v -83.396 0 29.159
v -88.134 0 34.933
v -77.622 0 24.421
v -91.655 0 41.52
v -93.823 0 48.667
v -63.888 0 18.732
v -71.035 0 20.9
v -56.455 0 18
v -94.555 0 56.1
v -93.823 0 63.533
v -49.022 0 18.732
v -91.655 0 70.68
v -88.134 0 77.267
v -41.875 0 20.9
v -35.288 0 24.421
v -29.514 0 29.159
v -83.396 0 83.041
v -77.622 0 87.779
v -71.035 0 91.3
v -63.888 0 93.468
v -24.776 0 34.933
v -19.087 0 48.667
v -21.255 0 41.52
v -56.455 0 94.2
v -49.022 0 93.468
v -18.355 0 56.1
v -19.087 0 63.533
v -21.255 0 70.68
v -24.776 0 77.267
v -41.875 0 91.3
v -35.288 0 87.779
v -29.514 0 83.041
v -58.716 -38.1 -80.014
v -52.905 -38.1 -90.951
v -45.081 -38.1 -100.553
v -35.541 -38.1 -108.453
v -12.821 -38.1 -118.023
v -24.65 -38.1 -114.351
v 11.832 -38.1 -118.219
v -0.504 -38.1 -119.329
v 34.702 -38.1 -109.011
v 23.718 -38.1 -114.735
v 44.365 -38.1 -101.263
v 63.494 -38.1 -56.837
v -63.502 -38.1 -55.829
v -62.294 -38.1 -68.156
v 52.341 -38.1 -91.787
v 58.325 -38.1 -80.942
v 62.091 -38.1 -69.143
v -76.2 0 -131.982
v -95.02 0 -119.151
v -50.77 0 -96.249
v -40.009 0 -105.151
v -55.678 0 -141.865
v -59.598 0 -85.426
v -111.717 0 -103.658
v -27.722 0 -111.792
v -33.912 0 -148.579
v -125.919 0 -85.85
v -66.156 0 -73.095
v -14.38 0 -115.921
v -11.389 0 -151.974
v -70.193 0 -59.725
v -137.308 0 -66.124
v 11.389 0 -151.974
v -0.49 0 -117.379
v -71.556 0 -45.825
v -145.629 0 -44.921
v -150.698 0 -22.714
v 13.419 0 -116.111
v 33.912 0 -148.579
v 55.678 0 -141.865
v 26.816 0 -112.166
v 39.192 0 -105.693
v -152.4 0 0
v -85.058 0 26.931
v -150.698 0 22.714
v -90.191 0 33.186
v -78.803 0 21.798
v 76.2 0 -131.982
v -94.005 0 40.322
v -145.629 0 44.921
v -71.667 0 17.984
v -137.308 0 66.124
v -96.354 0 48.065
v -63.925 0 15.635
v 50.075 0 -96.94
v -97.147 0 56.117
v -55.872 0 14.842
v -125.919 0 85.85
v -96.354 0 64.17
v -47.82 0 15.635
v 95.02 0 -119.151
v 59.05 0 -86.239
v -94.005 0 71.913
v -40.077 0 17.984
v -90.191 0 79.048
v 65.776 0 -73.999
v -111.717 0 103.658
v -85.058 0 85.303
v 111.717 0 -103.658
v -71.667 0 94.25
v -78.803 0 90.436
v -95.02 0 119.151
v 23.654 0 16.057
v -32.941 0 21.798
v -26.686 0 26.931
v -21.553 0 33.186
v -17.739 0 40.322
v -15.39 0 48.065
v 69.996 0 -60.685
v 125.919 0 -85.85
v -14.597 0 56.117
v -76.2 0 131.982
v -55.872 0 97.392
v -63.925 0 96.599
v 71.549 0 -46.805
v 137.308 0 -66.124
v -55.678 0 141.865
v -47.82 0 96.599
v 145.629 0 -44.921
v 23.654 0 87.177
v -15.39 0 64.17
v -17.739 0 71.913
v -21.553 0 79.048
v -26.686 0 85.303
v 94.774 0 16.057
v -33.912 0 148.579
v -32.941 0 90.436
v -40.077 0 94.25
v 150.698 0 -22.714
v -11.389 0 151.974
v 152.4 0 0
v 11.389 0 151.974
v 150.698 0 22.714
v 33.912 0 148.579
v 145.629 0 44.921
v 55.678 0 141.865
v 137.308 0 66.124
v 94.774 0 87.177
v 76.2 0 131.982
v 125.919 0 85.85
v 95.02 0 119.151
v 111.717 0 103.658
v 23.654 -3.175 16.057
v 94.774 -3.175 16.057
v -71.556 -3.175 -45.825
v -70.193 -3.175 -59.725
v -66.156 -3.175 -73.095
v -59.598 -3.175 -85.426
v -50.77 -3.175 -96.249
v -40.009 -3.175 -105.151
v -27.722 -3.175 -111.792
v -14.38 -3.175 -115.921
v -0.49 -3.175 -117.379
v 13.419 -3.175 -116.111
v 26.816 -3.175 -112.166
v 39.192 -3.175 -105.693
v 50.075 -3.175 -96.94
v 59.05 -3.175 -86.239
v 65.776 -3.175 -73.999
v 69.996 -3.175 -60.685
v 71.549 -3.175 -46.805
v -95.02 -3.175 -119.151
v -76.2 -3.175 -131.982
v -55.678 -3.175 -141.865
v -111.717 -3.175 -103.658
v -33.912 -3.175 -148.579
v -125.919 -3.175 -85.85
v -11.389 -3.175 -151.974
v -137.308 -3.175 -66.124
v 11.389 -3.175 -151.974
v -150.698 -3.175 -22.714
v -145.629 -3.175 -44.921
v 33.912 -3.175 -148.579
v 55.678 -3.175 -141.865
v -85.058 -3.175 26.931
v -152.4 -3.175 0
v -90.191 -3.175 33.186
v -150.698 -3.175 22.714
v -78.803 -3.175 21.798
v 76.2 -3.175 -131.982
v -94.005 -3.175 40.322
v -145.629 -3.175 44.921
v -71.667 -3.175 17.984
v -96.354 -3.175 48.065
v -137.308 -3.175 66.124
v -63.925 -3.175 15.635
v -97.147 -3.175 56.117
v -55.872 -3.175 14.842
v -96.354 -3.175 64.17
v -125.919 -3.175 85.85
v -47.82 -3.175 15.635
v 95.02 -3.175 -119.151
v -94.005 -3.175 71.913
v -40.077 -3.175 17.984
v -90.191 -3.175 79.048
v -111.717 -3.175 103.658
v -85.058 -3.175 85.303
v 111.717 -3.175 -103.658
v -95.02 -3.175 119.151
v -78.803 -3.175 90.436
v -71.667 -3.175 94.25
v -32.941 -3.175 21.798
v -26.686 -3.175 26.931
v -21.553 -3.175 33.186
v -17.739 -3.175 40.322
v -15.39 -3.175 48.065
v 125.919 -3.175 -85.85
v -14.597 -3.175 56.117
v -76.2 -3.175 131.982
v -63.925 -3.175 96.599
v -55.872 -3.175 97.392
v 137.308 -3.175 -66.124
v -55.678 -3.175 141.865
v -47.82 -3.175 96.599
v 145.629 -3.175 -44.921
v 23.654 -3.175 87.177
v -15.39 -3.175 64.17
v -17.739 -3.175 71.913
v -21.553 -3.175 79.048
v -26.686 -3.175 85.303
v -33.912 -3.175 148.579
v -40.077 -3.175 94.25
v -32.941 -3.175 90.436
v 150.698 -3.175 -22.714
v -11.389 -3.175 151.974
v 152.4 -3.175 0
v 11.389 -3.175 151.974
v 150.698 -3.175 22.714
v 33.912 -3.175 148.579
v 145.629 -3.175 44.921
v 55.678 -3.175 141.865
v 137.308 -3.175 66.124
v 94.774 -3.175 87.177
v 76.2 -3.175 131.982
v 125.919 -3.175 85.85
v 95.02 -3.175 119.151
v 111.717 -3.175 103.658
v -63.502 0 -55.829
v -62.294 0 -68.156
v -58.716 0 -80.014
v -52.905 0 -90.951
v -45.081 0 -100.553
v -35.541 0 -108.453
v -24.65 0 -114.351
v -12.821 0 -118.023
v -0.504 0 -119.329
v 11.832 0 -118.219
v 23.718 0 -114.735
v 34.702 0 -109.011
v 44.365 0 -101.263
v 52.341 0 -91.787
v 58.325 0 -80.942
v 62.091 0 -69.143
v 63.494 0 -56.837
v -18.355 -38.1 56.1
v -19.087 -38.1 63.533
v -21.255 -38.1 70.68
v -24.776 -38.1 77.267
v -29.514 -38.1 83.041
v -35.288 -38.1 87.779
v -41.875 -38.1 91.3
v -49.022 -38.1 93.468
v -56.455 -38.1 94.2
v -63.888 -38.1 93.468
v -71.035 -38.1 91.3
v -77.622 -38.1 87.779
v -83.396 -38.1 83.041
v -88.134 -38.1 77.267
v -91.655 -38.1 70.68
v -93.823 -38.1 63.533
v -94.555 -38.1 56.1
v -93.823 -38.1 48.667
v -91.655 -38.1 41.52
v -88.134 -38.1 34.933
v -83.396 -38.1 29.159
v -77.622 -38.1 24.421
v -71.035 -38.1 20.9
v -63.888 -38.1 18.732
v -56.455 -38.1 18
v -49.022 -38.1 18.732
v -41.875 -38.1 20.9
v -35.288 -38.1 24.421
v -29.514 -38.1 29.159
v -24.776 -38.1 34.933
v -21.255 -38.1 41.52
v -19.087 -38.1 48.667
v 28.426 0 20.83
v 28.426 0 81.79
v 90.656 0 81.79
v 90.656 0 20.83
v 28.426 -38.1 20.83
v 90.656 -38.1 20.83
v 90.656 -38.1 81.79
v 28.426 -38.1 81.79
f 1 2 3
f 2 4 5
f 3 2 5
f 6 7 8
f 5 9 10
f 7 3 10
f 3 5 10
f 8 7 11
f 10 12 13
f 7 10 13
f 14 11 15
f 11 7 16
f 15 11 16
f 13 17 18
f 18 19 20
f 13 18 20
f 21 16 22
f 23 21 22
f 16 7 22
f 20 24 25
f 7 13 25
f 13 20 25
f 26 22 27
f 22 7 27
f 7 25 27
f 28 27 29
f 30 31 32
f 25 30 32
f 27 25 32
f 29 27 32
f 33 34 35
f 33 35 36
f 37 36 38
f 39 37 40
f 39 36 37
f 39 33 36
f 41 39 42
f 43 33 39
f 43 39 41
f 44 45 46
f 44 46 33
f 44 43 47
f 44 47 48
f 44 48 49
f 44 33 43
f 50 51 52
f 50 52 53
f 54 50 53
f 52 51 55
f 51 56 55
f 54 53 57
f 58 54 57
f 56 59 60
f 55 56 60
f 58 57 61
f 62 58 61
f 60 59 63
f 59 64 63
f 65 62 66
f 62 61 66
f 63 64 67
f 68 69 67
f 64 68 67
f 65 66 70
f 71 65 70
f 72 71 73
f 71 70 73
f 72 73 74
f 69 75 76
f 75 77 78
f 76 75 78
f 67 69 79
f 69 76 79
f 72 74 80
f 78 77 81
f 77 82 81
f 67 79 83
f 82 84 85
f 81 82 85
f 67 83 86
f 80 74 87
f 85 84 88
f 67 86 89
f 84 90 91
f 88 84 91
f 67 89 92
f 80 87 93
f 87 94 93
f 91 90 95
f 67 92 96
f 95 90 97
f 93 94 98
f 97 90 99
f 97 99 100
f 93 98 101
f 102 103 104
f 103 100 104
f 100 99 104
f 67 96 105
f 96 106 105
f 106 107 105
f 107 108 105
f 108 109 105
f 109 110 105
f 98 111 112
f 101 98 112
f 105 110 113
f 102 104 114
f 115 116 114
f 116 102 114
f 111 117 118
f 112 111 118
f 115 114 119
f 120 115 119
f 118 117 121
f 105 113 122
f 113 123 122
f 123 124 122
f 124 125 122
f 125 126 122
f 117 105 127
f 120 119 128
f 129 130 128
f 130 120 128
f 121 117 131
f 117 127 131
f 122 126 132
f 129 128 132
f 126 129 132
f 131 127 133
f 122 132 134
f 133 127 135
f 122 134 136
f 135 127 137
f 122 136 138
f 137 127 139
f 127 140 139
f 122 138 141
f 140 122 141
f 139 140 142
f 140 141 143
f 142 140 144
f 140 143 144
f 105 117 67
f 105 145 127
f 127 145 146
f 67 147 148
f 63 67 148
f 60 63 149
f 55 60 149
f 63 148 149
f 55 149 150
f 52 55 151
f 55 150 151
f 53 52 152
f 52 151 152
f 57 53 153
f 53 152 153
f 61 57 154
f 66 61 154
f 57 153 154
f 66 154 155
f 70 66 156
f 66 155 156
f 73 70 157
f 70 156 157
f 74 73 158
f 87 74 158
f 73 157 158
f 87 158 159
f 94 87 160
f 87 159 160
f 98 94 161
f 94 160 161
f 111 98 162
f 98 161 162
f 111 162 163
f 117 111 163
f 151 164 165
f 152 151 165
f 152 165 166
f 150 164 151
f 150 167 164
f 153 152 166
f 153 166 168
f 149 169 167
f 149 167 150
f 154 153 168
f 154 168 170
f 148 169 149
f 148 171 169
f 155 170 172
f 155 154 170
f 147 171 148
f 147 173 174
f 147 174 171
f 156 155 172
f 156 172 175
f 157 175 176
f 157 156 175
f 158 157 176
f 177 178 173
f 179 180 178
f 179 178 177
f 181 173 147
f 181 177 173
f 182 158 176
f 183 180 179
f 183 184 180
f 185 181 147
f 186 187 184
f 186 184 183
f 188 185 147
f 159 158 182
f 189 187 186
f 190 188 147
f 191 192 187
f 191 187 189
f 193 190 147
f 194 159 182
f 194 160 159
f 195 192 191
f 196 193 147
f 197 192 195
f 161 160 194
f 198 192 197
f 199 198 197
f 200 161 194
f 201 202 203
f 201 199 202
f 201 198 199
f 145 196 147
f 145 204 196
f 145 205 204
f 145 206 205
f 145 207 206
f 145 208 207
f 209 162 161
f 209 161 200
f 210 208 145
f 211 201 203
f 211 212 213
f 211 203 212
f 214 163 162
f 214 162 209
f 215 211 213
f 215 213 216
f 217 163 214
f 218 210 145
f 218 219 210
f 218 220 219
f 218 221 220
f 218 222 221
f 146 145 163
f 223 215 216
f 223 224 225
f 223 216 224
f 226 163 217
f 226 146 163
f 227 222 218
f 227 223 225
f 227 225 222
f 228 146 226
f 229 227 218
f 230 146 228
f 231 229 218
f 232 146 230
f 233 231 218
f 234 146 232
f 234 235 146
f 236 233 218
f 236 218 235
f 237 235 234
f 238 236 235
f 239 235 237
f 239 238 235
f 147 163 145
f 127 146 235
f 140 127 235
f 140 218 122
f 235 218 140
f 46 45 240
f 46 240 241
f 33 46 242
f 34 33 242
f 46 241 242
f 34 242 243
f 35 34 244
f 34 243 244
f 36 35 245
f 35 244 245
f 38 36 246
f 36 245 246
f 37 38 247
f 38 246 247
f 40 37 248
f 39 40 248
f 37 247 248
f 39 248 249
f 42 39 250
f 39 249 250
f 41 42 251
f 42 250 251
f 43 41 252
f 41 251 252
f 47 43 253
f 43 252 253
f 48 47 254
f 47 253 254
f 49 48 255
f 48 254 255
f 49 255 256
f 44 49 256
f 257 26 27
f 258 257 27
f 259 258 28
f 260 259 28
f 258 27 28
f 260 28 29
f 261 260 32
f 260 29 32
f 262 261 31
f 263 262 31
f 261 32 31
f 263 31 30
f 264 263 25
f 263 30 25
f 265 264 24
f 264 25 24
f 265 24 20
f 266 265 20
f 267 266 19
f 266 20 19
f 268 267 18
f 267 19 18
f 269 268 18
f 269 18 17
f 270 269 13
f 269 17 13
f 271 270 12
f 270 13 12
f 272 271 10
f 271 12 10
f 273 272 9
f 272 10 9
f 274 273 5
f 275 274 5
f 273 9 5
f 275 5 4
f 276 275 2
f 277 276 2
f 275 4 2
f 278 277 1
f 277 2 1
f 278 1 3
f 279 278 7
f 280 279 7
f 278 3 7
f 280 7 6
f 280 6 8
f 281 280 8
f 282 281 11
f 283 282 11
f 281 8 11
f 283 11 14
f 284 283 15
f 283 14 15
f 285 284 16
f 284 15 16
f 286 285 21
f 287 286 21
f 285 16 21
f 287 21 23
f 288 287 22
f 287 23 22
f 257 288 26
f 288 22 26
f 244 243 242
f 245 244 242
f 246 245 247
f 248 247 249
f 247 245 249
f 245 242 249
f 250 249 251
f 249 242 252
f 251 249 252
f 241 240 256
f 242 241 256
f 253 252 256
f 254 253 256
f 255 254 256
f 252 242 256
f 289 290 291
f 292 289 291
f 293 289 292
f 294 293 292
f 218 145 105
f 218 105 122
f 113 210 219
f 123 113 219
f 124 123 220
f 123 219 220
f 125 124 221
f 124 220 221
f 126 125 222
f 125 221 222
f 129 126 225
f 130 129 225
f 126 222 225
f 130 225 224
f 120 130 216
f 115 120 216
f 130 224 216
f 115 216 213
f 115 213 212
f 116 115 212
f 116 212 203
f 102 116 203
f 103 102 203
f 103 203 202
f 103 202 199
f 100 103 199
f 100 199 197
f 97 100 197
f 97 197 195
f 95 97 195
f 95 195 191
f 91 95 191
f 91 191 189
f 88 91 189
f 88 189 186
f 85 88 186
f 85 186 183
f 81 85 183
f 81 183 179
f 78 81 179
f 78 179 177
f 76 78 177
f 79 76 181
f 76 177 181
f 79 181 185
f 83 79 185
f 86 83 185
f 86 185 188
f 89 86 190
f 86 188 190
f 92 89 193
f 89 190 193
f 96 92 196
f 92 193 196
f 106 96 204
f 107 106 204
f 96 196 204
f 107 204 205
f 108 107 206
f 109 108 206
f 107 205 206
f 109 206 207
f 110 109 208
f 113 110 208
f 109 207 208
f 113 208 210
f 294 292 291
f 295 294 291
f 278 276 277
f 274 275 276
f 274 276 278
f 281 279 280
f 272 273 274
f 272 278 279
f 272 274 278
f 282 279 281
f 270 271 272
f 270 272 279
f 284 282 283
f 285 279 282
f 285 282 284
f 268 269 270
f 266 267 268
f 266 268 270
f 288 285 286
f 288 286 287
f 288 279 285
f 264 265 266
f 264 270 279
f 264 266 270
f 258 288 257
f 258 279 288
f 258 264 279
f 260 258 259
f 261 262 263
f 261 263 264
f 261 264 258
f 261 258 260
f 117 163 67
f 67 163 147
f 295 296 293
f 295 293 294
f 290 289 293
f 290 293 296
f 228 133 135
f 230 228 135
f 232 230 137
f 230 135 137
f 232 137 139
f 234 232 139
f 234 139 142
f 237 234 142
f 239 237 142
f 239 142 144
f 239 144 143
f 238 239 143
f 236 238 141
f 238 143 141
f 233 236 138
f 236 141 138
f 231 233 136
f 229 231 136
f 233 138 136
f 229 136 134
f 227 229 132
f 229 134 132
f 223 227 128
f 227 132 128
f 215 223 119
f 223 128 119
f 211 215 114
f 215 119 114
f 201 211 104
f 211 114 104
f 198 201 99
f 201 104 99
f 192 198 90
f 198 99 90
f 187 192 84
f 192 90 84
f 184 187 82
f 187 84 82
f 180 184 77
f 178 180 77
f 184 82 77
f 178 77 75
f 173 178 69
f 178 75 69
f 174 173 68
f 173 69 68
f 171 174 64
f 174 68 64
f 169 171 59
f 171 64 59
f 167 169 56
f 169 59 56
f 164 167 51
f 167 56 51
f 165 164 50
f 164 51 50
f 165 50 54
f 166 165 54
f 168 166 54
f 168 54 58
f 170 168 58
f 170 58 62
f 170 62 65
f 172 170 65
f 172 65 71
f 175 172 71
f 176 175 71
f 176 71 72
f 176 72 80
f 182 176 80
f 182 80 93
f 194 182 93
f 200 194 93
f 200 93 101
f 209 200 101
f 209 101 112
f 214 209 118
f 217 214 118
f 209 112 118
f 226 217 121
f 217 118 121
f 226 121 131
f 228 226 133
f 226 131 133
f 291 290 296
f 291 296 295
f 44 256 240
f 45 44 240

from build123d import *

# Parameters (mm, degrees)
F0_R      = 152.4
F1_DEPTH  = 3.175
F3_W      = 71.12
F3_H      = 71.12
F4_DEPTH  = 25.4
F6_DEPTH  = 25.4
F2_R      = 41.275
F7_DEPTH  = 25.4
F8_R      = 38.1
F9_DEPTH  = 38.1
F10_W     = 62.23
F10_H     = 60.96
F11_DEPTH = 38.1
F13_DEPTH = 38.1


with BuildPart() as f1:
    # F0 (on Front) → F1 (new body)
    with BuildSketch(Plane.XZ):
        Circle(F0_R)
    extrude(amount=F1_DEPTH)

    # F3 (on face) → F4 (cut)
    with BuildSketch(Plane.XZ.offset(3.175)):
        with Locations((59.213508, 51.616844)):
            Rectangle(F3_W, F3_H)
    extrude(amount=-F4_DEPTH, mode=Mode.SUBTRACT)

    # F5 (on face) → F6 (cut)
    with BuildSketch(Plane.XZ.offset(3.175)):
        with BuildLine():
            Line((71.548938, -46.80524), (-71.555652, -45.825023))
            ThreePointArc((-71.555652, -45.825023), (-0.49012, -117.378996), (71.548938, -46.80524))
        make_face()
    extrude(amount=-F6_DEPTH, mode=Mode.SUBTRACT)

    # F2 (on face) → F7 (cut)
    with BuildSketch(Plane.XZ.offset(3.175)):
        with Locations((-55.872221, 56.117274)):
            Circle(F2_R)
    extrude(amount=-F7_DEPTH, mode=Mode.SUBTRACT)


with BuildPart() as f9:
    # F8 (on Front) → F9 (new body)
    with BuildSketch(Plane.XZ):
        with Locations((-56.45477, 56.100138)):
            Circle(F8_R)
    extrude(amount=F9_DEPTH)


with BuildPart() as f11:
    # F10 (on Front) → F11 (new body)
    with BuildSketch(Plane.XZ):
        with Locations((59.541221, 51.309557)):
            Rectangle(F10_W, F10_H)
    extrude(amount=F11_DEPTH)


with BuildPart() as f13:
    # F12 (on Front) → F13 (new body)
    with BuildSketch(Plane.XZ):
        with BuildLine():
            Line((63.494001, -56.836682), (-63.502, -55.828842))
            ThreePointArc((-63.502, -55.828842), (-0.503936, -119.328842), (63.494001, -56.836682))
        make_face()
    extrude(amount=F13_DEPTH)


solid = Compound([f1.part, f9.part, f11.part, f13.part])
